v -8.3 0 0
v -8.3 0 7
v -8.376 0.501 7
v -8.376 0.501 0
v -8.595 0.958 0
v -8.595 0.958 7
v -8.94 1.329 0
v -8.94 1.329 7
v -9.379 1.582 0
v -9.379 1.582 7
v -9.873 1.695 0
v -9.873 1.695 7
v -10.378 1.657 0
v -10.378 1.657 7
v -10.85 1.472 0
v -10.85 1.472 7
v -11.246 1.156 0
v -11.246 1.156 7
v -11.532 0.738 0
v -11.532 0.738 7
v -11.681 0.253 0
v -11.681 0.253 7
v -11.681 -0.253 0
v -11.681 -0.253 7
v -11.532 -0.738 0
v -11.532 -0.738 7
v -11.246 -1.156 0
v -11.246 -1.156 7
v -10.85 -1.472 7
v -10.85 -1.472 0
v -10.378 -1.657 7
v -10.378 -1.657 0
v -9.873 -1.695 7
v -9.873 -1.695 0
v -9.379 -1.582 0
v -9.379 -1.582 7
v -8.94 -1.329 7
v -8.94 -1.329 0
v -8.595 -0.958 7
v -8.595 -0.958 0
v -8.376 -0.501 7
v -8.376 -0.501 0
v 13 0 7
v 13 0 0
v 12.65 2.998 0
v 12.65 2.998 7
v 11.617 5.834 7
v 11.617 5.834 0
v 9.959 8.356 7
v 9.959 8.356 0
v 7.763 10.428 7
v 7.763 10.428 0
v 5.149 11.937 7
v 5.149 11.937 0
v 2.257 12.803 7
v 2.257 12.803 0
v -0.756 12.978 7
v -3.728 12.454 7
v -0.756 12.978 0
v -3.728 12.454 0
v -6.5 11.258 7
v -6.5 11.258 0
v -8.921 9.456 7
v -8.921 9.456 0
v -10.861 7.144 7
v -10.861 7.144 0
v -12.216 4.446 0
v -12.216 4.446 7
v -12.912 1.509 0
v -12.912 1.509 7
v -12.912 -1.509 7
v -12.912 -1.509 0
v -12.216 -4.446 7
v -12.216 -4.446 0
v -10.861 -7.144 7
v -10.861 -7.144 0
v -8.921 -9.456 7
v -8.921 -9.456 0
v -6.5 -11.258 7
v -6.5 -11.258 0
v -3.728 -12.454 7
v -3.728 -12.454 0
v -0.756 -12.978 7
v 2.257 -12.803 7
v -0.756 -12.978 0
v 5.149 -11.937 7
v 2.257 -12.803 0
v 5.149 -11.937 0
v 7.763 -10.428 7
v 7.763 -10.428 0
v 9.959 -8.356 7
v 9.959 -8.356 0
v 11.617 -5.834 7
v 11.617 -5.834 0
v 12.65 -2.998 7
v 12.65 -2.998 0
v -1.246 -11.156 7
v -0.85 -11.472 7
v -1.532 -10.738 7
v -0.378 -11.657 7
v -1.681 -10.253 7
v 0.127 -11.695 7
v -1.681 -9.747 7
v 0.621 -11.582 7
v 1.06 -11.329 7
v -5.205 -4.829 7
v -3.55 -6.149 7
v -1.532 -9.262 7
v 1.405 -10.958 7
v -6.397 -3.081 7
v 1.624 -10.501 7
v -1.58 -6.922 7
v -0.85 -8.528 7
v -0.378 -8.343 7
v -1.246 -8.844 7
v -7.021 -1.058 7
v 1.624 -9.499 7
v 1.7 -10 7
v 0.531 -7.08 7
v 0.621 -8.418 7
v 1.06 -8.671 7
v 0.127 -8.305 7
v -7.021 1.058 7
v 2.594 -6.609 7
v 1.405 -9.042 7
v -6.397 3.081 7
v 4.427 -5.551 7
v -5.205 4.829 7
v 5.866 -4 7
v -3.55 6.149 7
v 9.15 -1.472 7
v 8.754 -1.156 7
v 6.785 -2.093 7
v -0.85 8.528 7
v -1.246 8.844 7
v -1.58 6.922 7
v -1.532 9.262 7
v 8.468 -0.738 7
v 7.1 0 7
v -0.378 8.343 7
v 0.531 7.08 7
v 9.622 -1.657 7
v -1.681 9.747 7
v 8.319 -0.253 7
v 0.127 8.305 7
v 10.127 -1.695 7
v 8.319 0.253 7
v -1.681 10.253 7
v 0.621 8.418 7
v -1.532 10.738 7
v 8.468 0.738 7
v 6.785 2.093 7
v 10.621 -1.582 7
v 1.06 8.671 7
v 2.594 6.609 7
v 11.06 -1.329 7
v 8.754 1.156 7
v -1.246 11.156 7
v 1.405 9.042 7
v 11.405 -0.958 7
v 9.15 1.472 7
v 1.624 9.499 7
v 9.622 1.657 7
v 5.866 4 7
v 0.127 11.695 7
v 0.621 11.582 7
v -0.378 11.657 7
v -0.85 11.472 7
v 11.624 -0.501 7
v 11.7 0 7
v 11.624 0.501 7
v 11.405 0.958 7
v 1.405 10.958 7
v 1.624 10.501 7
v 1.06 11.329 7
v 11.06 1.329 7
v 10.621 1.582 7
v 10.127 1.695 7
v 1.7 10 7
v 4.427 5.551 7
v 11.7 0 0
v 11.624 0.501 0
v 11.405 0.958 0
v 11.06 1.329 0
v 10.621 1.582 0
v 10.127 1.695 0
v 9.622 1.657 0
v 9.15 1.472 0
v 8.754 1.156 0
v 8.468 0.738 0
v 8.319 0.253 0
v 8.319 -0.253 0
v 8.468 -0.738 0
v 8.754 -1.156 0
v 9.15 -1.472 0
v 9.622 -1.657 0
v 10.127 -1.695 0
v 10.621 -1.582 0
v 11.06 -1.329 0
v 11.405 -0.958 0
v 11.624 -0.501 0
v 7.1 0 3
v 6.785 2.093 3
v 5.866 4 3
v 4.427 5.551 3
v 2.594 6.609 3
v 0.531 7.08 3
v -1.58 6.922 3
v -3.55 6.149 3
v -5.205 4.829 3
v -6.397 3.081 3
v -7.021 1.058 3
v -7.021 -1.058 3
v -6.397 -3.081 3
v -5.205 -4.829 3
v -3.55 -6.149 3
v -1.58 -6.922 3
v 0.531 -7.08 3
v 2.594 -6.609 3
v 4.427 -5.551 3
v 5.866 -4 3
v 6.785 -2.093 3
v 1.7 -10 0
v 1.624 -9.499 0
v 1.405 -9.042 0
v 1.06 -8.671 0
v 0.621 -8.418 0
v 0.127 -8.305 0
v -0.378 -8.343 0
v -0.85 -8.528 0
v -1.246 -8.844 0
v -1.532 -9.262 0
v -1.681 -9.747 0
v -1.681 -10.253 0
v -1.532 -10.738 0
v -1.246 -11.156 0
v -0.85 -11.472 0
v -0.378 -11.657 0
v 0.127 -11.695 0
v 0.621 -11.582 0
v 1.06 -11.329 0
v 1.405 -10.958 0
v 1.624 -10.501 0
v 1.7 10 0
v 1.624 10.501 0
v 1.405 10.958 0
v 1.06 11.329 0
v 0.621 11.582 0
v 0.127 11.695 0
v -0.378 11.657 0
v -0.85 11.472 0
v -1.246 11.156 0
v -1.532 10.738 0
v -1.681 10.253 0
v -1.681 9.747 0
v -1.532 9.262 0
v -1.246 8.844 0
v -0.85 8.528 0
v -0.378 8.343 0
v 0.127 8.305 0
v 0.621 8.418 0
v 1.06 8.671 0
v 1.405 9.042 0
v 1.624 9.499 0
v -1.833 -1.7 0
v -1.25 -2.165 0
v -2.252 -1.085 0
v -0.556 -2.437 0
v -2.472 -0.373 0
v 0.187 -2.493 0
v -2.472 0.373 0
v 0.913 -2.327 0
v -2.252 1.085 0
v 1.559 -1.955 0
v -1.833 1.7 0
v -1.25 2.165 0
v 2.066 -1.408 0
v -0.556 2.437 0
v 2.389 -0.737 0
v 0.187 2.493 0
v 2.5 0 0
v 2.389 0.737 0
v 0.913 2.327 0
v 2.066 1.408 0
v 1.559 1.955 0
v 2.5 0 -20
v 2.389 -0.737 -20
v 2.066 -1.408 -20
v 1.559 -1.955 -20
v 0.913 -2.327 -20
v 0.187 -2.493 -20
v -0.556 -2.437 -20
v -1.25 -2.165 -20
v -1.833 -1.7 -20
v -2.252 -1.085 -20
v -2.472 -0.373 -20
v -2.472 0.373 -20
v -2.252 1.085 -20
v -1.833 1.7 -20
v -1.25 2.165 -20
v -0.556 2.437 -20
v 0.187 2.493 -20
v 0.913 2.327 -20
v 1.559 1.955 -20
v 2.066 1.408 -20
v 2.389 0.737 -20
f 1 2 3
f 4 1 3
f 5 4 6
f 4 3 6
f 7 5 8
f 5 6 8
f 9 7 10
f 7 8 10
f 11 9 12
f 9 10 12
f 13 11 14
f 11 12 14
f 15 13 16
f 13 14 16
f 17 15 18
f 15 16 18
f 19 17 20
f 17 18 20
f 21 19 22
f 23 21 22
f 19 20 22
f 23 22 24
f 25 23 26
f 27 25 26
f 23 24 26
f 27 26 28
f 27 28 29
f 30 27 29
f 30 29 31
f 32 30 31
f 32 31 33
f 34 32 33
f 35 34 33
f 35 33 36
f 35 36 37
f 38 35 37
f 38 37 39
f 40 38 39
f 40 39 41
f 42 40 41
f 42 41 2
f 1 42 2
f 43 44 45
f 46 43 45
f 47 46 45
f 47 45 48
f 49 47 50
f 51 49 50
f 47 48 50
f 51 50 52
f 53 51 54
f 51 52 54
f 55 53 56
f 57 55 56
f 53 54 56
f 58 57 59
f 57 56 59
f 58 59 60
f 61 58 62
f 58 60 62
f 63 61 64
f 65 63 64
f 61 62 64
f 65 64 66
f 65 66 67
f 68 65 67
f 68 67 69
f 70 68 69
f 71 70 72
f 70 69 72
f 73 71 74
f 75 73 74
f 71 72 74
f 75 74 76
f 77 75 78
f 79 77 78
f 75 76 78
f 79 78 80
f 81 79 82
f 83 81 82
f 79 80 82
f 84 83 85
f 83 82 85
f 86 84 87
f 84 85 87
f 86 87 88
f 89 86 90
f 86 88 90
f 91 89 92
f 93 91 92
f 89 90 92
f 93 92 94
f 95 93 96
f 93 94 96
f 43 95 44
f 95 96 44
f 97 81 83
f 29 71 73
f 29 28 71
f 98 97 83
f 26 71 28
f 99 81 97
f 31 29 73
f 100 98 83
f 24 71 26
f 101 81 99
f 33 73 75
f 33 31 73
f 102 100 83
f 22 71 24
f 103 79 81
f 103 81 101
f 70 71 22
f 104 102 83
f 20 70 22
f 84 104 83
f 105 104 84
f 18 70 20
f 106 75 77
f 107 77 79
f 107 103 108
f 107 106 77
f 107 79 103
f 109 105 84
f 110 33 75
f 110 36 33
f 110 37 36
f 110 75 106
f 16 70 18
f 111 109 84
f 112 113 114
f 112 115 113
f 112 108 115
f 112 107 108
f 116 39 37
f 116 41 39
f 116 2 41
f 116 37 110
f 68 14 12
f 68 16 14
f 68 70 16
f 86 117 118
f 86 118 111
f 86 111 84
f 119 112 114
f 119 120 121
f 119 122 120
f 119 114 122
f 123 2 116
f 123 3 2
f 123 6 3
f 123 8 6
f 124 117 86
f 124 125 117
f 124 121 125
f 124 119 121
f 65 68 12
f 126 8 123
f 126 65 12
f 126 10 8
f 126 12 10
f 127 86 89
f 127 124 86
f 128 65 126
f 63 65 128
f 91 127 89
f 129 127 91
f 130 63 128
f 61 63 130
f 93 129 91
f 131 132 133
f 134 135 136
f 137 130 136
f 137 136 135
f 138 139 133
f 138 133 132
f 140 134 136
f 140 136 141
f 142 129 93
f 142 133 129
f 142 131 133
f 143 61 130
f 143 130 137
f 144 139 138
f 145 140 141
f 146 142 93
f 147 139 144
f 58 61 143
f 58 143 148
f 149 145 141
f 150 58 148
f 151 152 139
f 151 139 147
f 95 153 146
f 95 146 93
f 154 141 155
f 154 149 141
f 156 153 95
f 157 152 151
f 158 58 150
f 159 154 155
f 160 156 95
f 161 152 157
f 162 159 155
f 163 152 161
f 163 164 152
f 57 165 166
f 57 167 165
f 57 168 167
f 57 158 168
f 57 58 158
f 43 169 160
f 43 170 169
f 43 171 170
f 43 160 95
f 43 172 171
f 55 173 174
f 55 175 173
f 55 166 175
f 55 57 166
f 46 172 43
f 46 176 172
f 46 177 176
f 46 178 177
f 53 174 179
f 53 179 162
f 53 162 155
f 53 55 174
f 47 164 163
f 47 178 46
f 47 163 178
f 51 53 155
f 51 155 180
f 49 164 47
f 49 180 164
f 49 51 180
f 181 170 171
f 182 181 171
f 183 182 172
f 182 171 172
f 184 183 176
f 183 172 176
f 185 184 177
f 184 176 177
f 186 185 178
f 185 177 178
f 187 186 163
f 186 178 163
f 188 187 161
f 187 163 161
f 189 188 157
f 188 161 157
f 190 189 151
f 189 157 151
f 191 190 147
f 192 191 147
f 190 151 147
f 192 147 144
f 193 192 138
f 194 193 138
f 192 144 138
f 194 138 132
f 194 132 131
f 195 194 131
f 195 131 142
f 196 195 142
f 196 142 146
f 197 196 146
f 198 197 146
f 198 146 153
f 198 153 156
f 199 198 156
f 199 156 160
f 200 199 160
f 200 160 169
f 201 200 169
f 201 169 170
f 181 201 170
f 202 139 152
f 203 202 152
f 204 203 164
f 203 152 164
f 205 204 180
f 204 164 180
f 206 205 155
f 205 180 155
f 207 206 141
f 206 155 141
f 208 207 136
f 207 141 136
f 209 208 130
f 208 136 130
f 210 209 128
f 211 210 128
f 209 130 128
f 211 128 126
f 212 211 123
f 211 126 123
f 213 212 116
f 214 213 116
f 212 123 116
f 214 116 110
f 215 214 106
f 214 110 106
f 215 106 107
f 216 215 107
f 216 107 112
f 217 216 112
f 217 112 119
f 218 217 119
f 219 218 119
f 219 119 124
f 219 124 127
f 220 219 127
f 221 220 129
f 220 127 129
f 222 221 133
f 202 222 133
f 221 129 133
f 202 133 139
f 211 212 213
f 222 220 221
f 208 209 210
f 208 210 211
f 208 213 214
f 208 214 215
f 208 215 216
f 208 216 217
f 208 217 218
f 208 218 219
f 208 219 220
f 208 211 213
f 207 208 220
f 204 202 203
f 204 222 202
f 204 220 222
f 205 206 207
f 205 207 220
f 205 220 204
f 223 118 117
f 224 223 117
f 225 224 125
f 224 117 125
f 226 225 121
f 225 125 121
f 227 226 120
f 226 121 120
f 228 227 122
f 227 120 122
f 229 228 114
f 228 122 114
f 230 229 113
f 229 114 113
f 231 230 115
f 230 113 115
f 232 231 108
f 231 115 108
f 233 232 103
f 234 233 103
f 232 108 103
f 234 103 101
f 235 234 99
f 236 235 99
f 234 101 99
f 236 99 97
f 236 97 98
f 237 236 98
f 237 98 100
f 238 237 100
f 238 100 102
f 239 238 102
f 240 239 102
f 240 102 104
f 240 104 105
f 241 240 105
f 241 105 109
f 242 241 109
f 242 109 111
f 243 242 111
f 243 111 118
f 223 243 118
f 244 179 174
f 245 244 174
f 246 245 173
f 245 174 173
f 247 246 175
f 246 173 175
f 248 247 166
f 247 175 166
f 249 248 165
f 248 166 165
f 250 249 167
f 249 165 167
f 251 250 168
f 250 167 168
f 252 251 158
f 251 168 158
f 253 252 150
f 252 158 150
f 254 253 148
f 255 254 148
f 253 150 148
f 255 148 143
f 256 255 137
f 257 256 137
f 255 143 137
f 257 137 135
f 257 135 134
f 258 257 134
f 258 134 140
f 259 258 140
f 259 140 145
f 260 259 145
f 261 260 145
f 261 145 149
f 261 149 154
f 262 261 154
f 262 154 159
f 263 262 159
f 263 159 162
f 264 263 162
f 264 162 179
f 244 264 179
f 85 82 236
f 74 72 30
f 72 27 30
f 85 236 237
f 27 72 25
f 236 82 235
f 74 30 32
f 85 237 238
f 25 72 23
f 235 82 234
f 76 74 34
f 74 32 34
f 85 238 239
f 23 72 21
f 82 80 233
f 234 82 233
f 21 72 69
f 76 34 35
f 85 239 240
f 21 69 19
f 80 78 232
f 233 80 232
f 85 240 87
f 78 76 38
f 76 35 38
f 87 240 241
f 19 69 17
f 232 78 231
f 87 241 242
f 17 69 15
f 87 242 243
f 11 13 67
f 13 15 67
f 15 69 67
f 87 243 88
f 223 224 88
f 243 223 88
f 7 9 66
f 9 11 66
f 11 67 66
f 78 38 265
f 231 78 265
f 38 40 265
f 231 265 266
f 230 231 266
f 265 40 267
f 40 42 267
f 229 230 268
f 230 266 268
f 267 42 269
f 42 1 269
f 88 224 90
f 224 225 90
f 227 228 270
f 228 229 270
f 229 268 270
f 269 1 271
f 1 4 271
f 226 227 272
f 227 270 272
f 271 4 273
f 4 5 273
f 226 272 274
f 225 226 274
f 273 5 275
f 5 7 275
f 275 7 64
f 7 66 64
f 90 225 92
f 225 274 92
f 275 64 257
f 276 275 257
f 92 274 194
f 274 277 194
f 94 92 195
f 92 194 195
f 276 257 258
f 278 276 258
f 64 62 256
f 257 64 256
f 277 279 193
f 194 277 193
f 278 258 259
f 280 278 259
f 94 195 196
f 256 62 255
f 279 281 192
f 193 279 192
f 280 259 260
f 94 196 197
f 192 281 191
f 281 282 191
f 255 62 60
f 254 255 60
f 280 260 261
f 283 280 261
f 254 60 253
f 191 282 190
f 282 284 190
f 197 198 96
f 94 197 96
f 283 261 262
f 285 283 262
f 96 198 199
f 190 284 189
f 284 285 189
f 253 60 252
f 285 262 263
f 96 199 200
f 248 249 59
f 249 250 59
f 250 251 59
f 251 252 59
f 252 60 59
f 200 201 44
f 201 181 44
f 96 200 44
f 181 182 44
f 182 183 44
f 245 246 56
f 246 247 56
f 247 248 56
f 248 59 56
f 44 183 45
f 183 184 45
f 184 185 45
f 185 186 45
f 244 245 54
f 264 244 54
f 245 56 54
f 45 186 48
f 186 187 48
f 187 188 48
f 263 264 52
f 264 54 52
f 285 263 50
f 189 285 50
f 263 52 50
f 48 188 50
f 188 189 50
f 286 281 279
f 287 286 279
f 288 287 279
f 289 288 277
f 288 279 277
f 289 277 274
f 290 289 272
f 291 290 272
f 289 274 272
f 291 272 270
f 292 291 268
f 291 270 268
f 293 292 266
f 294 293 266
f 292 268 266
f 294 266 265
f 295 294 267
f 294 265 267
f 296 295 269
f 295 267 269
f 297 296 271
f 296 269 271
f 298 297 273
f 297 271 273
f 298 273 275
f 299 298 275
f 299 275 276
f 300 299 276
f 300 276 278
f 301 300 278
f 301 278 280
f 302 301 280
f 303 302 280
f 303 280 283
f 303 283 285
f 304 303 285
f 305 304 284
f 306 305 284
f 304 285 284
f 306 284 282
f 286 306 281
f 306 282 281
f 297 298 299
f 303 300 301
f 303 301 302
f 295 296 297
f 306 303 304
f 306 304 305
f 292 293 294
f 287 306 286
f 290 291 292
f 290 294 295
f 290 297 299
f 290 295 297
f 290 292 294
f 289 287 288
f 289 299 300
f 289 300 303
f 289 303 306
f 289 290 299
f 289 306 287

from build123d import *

# Parameters (mm, degrees)
SKETCH_1_R          = 13
EXTRUDE_1_DEPTH     = 7
SKETCH_2_R          = 7.1
CUT_EXTRUDE_1_DEPTH = 4
SKETCH_3_R          = 2.5
EXTRUDE_2_DEPTH     = 20
HOLE_WIZARD_M31_D   = 3.4


with BuildPart() as part:
    # Эскиз1 → Бобышка-Вытянуть1 (new body)
    with BuildSketch(Plane.XY):
        Circle(SKETCH_1_R)
    extrude(amount=EXTRUDE_1_DEPTH)

    # Эскиз2 → Вырез-Вытянуть1 (cut)
    with BuildSketch(Plane.XY.offset(7)):
        Circle(SKETCH_2_R)
    extrude(amount=-CUT_EXTRUDE_1_DEPTH, mode=Mode.SUBTRACT)

    # Эскиз3 → Бобышка-Вытянуть2 (add)
    with BuildSketch(Plane(origin=(0, 0, 0), x_dir=(-1, 0, 0), z_dir=(0, 0, -1))):
        with Locations(Location((0, 0, 0), (0, 0, 180))):
            Circle(SKETCH_3_R)
    extrude(amount=EXTRUDE_2_DEPTH)

    # Отверстие с зазором M31 (through all)
    with Locations(Plane(origin=(0, 0, 0), x_dir=(-1, 0, 0), z_dir=(0, 0, -1))):
        with Locations((0, 10), (-10, 0), (0, -10), (10, 0)):
            Hole(HOLE_WIZARD_M31_D / 2)


solid = part.part
